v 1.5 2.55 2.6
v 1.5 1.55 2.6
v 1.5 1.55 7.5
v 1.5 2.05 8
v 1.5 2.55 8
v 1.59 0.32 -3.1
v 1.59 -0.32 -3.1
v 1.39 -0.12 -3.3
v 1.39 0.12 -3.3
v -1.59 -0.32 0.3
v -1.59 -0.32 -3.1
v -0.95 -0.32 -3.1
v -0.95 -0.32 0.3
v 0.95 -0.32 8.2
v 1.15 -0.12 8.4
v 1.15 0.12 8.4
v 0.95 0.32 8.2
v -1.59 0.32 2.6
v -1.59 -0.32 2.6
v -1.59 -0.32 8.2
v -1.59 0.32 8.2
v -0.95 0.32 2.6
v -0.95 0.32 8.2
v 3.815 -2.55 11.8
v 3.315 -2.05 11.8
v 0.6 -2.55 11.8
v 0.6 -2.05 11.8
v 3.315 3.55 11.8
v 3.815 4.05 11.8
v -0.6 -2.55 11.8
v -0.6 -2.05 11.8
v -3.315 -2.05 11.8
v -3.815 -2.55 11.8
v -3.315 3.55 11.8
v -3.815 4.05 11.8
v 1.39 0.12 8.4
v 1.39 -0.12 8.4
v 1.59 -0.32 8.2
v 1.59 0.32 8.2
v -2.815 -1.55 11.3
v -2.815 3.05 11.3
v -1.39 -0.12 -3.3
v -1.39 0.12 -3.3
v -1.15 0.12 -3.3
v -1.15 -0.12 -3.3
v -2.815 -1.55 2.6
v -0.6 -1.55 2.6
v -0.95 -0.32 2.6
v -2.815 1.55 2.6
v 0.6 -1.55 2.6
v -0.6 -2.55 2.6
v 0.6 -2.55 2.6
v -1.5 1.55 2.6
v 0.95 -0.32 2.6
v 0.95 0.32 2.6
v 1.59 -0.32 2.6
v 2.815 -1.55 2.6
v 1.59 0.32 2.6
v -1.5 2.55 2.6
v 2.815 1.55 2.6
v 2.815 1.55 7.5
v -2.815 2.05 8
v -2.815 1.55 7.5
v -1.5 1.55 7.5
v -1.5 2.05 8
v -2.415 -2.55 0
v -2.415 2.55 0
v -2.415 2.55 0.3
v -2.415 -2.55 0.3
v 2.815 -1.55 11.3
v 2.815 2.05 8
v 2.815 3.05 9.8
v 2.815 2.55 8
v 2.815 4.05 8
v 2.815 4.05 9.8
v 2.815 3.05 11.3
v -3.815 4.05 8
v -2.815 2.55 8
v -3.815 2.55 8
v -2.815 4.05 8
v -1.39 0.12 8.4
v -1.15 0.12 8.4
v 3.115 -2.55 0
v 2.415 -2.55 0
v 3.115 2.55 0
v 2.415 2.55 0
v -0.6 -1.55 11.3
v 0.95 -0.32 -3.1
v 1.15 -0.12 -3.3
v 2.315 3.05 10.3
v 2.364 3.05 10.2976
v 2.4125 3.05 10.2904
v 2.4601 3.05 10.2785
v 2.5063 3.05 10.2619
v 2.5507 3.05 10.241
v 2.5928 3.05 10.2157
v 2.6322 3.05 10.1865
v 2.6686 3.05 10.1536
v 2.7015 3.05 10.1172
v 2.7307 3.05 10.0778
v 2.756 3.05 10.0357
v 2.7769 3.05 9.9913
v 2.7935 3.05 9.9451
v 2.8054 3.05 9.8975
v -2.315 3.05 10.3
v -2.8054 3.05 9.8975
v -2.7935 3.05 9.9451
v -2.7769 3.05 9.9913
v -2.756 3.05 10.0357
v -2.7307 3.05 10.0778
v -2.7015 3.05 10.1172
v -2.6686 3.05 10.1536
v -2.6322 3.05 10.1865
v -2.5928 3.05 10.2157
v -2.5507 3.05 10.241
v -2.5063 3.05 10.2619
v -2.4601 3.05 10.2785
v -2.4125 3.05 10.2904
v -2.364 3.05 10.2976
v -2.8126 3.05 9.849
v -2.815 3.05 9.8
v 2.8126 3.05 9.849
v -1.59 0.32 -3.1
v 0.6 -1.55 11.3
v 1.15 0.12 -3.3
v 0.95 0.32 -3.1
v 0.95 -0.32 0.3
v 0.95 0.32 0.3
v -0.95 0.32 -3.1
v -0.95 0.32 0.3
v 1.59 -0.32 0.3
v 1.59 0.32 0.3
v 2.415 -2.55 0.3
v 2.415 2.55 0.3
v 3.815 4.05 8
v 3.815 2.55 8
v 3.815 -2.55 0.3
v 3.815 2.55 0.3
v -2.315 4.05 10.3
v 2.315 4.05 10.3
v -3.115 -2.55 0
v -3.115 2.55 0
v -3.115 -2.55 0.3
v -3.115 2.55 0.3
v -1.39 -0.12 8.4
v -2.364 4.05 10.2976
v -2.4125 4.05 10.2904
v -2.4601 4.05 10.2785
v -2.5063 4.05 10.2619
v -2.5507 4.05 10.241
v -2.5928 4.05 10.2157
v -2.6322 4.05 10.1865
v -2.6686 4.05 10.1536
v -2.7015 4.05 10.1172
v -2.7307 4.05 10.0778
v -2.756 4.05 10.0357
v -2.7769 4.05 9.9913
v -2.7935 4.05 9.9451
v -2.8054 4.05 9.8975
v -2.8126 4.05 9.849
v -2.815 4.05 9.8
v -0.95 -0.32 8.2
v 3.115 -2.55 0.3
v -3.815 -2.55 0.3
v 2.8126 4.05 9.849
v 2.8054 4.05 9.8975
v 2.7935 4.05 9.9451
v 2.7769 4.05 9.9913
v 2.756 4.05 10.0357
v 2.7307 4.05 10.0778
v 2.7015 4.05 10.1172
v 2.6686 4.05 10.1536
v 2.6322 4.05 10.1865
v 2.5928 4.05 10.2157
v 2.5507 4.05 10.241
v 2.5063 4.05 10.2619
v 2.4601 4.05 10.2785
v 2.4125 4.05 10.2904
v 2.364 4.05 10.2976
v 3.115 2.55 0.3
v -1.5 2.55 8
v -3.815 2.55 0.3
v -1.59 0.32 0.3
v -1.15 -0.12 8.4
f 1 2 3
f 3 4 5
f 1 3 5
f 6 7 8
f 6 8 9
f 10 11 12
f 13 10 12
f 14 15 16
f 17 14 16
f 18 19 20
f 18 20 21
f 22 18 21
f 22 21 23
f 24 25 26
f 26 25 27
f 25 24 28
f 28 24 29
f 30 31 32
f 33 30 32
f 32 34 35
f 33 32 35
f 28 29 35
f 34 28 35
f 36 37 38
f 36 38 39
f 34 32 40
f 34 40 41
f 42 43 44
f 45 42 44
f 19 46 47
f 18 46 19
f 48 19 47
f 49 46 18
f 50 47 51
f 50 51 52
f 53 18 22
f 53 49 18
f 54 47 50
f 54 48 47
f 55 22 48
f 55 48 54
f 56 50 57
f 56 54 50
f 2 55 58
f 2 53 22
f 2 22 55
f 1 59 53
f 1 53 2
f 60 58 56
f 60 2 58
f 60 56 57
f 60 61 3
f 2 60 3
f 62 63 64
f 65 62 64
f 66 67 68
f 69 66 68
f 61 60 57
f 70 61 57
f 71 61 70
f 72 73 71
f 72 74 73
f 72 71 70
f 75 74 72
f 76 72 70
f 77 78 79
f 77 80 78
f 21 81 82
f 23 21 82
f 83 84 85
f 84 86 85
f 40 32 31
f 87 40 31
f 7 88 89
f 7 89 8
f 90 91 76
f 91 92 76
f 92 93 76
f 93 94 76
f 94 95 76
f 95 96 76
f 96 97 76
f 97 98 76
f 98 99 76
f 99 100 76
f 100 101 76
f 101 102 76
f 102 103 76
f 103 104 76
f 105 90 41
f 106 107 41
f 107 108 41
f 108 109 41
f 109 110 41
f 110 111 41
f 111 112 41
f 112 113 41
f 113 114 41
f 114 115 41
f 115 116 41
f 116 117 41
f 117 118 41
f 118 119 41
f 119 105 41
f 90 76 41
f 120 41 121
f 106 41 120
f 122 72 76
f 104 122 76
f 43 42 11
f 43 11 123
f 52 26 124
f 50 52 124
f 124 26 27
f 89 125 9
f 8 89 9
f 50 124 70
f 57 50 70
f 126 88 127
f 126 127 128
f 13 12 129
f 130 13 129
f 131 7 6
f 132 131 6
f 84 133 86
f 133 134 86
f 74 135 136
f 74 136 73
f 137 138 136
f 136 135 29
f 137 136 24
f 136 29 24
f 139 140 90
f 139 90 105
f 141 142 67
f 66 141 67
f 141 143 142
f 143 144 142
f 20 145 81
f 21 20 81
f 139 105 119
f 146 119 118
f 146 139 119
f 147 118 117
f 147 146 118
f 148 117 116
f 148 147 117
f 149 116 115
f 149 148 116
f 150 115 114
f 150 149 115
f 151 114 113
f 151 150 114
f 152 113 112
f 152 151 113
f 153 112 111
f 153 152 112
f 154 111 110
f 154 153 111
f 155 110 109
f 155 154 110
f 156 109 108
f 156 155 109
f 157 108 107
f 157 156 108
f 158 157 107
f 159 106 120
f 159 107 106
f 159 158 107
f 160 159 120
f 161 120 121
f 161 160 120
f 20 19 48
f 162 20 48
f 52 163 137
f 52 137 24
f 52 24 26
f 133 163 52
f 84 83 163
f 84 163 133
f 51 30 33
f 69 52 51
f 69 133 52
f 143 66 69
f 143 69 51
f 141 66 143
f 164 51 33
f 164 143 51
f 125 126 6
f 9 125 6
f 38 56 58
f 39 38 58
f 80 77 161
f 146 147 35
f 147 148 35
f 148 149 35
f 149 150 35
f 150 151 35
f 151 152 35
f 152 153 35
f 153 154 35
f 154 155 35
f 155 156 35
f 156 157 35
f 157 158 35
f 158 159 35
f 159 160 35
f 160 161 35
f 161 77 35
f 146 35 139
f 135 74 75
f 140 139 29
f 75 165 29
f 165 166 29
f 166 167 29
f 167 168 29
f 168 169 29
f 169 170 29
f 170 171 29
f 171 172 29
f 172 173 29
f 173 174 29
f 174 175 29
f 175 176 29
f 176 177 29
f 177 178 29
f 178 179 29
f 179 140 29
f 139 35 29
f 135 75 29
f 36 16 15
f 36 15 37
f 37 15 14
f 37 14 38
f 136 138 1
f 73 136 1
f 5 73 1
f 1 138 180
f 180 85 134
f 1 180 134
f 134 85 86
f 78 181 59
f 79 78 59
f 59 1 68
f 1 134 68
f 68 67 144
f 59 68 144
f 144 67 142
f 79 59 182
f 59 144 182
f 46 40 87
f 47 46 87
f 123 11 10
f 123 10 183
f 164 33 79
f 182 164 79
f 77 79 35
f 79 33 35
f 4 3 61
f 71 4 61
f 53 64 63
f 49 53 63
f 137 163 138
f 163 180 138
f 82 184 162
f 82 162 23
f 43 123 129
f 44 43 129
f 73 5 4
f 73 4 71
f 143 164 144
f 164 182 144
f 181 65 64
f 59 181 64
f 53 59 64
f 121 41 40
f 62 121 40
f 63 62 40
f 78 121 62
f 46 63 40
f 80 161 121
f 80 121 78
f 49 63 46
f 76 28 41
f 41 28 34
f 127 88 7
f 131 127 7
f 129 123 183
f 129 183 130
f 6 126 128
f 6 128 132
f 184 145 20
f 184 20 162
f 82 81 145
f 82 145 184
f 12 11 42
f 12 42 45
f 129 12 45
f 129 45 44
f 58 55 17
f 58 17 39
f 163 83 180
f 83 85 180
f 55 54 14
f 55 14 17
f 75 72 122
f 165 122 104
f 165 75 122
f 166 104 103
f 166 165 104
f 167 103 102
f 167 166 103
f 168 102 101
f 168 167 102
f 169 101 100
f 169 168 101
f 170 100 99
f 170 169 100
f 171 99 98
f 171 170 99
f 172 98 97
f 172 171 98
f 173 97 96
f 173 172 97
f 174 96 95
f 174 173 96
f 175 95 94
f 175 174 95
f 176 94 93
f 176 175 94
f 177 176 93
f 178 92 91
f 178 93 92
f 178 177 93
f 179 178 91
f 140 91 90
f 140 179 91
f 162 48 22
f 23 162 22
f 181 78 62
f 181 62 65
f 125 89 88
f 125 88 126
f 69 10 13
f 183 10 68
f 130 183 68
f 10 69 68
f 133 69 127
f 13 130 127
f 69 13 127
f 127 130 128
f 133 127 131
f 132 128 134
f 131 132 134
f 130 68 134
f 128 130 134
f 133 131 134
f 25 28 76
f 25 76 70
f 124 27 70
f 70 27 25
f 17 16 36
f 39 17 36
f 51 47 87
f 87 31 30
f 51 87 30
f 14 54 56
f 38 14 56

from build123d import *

# Parameters (mm, degrees)
EXTRUDE_1_DEPTH                    = 2.55
CUT_EXTRUDE_1_DEPTH                = 9.2
EXTRUDE_2_DEPTH                    = 3.8
SKETCH_4_W                         = 5.63
SKETCH_4_H                         = 1
CUT_EXTRUDE_2_DEPTH                = 3.8
CUT_EXTRUDE_3_REACH                = 16.048
CHAMFER_1_SIZE                     = 0.5
EXTRUDE_START                      = -3.6
SKETCH_6_W                         = 0.64
SKETCH_6_H                         = 0.64
EXTRUDE_3_DEPTH                    = 11.7
CHAMFER_2_SIZE                     = 0.2
PATTERN_LINEAR_1_COUNT             = 2
PATTERN_LINEAR_1_PITCH             = 2.54
CHAMFER_2_OF_PATTERN_LINEAR_1_SIZE = 0.2


with BuildPart() as part:
    # Эскиз1 → Бобышка-Вытянуть1 (new, symmetric)
    with BuildSketch(Plane(origin=(0, 0, 0), x_dir=(1, 0, 0), z_dir=(0, 1, 0))):
        Polygon((-2.415, -0.3), (2.415, -0.3), (2.415, 0), (3.115, 0), (3.115, -0.3), (3.815, -0.3), (3.815, -11.8), (-3.815, -11.8), (-3.815, -0.3), (-3.115, -0.3), (-3.115, 0), (-2.415, 0), align=None)
    extrude(amount=EXTRUDE_1_DEPTH, both=True)

    # Эскиз2 → Вырез-Вытянуть1 (cut)
    with BuildSketch(Plane.XY.offset(11.8)):
        Polygon((-2.815, 1.55), (-2.815, -1.55), (-0.6, -1.55), (-0.6, -2.55), (0.6, -2.55), (0.6, -1.55), (2.815, -1.55), (2.815, 1.55), (1.5, 1.55), (1.5, 2.55), (-1.5, 2.55), (-1.5, 1.55), align=None)
    extrude(amount=-CUT_EXTRUDE_1_DEPTH, mode=Mode.SUBTRACT)

    # Эскиз3 → Бобышка-Вытянуть2 (add)
    with BuildSketch(Plane.XY.offset(11.8)):
        Polygon((-3.815, 2.55), (-3.815, 4.05), (3.815, 4.05), (3.815, 2.55), (2.815, 2.55), (2.815, 3.05), (-2.815, 3.05), (-2.815, 2.55), align=None)
    extrude(amount=-EXTRUDE_2_DEPTH)

    # Эскиз4 → Вырез-Вытянуть2 (cut)
    with BuildSketch(Plane.XY.offset(11.8)):
        with Locations((0, 2.05)):
            Rectangle(SKETCH_4_W, SKETCH_4_H)
    extrude(amount=-CUT_EXTRUDE_2_DEPTH, mode=Mode.SUBTRACT)

    # Эскиз5 → Вырез-Вытянуть3 (cut, up to next)
    with BuildSketch(Plane(origin=(0, 4.05, 0), x_dir=(1, 0, 0), z_dir=(0, 1, 0)), mode=Mode.PRIVATE) as cut_extrude_3_sk1:
        with BuildLine():
            Line((2.815, -8), (2.815, -9.8))
            ThreePointArc((2.815, -9.8), (2.668553391, -10.153553391), (2.315, -10.3))
            Line((2.315, -10.3), (-2.315, -10.3))
            ThreePointArc((-2.315, -10.3), (-2.668553391, -10.153553391), (-2.815, -9.8))
            Line((-2.815, -9.8), (-2.815, -8))
            Line((-2.815, -8), (2.815, -8))
        make_face()
    cut_extrude_3_tool1 = extrude(cut_extrude_3_sk1.sketch, amount=-CUT_EXTRUDE_3_REACH, mode=Mode.PRIVATE) & part.part
    add(cut_extrude_3_tool1.solids().sort_by_distance((0, 4.05, 9.141324))[0], mode=Mode.SUBTRACT)

    # Фаска1
    chamfer_1_edges = [part.edges().sort_by_distance(p)[0] for p in [
        (-2.1575, 1.55, 8),
        (2.1575, 1.55, 8),
        (-2.815, 0.75, 11.8),
        (-1.7075, -1.55, 11.8),
        (1.7075, -1.55, 11.8),
        (2.815, 0.75, 11.8),
        (0, 3.05, 11.8),
    ]]
    chamfer(chamfer_1_edges, length=CHAMFER_1_SIZE)

    # Эскиз6 → Бобышка-Вытянуть3 (add)
    with BuildSketch(Plane.XY.offset(0.3).offset(EXTRUDE_START)):
        with Locations((1.27, 0)):
            Rectangle(SKETCH_6_W, SKETCH_6_H)
    extrude_3 = extrude(amount=EXTRUDE_3_DEPTH)

    # Фаска2
    chamfer_2_edges = [part.edges().sort_by_distance(p)[0] for p in [
        (1.27, 0.32, 8.4),
        (1.59, 0, 8.4),
        (1.27, -0.32, 8.4),
        (0.95, 0, 8.4),
        (0.95, 0, -3.3),
        (1.27, 0.32, -3.3),
        (1.59, 0, -3.3),
        (1.27, -0.32, -3.3),
    ]]
    chamfer(chamfer_2_edges, length=CHAMFER_2_SIZE)

    # Линейный массив1: Бобышка-Вытянуть3 ×2
    with Locations(*[(-i * PATTERN_LINEAR_1_PITCH, 0, 0) for i in range(1, PATTERN_LINEAR_1_COUNT)]):
        add(extrude_3)

    # Фаска2 of Линейный массив1
    chamfer_2_of_pattern_linear_1_edges = [part.edges().sort_by_distance(p)[0] for p in [
        (-1.27, 0.32, 8.4),
        (-0.95, 0, 8.4),
        (-1.27, -0.32, 8.4),
        (-1.59, 0, 8.4),
        (-1.59, 0, -3.3),
        (-1.27, 0.32, -3.3),
        (-0.95, 0, -3.3),
        (-1.27, -0.32, -3.3),
    ]]
    chamfer(chamfer_2_of_pattern_linear_1_edges, length=CHAMFER_2_OF_PATTERN_LINEAR_1_SIZE)


solid = part.part
